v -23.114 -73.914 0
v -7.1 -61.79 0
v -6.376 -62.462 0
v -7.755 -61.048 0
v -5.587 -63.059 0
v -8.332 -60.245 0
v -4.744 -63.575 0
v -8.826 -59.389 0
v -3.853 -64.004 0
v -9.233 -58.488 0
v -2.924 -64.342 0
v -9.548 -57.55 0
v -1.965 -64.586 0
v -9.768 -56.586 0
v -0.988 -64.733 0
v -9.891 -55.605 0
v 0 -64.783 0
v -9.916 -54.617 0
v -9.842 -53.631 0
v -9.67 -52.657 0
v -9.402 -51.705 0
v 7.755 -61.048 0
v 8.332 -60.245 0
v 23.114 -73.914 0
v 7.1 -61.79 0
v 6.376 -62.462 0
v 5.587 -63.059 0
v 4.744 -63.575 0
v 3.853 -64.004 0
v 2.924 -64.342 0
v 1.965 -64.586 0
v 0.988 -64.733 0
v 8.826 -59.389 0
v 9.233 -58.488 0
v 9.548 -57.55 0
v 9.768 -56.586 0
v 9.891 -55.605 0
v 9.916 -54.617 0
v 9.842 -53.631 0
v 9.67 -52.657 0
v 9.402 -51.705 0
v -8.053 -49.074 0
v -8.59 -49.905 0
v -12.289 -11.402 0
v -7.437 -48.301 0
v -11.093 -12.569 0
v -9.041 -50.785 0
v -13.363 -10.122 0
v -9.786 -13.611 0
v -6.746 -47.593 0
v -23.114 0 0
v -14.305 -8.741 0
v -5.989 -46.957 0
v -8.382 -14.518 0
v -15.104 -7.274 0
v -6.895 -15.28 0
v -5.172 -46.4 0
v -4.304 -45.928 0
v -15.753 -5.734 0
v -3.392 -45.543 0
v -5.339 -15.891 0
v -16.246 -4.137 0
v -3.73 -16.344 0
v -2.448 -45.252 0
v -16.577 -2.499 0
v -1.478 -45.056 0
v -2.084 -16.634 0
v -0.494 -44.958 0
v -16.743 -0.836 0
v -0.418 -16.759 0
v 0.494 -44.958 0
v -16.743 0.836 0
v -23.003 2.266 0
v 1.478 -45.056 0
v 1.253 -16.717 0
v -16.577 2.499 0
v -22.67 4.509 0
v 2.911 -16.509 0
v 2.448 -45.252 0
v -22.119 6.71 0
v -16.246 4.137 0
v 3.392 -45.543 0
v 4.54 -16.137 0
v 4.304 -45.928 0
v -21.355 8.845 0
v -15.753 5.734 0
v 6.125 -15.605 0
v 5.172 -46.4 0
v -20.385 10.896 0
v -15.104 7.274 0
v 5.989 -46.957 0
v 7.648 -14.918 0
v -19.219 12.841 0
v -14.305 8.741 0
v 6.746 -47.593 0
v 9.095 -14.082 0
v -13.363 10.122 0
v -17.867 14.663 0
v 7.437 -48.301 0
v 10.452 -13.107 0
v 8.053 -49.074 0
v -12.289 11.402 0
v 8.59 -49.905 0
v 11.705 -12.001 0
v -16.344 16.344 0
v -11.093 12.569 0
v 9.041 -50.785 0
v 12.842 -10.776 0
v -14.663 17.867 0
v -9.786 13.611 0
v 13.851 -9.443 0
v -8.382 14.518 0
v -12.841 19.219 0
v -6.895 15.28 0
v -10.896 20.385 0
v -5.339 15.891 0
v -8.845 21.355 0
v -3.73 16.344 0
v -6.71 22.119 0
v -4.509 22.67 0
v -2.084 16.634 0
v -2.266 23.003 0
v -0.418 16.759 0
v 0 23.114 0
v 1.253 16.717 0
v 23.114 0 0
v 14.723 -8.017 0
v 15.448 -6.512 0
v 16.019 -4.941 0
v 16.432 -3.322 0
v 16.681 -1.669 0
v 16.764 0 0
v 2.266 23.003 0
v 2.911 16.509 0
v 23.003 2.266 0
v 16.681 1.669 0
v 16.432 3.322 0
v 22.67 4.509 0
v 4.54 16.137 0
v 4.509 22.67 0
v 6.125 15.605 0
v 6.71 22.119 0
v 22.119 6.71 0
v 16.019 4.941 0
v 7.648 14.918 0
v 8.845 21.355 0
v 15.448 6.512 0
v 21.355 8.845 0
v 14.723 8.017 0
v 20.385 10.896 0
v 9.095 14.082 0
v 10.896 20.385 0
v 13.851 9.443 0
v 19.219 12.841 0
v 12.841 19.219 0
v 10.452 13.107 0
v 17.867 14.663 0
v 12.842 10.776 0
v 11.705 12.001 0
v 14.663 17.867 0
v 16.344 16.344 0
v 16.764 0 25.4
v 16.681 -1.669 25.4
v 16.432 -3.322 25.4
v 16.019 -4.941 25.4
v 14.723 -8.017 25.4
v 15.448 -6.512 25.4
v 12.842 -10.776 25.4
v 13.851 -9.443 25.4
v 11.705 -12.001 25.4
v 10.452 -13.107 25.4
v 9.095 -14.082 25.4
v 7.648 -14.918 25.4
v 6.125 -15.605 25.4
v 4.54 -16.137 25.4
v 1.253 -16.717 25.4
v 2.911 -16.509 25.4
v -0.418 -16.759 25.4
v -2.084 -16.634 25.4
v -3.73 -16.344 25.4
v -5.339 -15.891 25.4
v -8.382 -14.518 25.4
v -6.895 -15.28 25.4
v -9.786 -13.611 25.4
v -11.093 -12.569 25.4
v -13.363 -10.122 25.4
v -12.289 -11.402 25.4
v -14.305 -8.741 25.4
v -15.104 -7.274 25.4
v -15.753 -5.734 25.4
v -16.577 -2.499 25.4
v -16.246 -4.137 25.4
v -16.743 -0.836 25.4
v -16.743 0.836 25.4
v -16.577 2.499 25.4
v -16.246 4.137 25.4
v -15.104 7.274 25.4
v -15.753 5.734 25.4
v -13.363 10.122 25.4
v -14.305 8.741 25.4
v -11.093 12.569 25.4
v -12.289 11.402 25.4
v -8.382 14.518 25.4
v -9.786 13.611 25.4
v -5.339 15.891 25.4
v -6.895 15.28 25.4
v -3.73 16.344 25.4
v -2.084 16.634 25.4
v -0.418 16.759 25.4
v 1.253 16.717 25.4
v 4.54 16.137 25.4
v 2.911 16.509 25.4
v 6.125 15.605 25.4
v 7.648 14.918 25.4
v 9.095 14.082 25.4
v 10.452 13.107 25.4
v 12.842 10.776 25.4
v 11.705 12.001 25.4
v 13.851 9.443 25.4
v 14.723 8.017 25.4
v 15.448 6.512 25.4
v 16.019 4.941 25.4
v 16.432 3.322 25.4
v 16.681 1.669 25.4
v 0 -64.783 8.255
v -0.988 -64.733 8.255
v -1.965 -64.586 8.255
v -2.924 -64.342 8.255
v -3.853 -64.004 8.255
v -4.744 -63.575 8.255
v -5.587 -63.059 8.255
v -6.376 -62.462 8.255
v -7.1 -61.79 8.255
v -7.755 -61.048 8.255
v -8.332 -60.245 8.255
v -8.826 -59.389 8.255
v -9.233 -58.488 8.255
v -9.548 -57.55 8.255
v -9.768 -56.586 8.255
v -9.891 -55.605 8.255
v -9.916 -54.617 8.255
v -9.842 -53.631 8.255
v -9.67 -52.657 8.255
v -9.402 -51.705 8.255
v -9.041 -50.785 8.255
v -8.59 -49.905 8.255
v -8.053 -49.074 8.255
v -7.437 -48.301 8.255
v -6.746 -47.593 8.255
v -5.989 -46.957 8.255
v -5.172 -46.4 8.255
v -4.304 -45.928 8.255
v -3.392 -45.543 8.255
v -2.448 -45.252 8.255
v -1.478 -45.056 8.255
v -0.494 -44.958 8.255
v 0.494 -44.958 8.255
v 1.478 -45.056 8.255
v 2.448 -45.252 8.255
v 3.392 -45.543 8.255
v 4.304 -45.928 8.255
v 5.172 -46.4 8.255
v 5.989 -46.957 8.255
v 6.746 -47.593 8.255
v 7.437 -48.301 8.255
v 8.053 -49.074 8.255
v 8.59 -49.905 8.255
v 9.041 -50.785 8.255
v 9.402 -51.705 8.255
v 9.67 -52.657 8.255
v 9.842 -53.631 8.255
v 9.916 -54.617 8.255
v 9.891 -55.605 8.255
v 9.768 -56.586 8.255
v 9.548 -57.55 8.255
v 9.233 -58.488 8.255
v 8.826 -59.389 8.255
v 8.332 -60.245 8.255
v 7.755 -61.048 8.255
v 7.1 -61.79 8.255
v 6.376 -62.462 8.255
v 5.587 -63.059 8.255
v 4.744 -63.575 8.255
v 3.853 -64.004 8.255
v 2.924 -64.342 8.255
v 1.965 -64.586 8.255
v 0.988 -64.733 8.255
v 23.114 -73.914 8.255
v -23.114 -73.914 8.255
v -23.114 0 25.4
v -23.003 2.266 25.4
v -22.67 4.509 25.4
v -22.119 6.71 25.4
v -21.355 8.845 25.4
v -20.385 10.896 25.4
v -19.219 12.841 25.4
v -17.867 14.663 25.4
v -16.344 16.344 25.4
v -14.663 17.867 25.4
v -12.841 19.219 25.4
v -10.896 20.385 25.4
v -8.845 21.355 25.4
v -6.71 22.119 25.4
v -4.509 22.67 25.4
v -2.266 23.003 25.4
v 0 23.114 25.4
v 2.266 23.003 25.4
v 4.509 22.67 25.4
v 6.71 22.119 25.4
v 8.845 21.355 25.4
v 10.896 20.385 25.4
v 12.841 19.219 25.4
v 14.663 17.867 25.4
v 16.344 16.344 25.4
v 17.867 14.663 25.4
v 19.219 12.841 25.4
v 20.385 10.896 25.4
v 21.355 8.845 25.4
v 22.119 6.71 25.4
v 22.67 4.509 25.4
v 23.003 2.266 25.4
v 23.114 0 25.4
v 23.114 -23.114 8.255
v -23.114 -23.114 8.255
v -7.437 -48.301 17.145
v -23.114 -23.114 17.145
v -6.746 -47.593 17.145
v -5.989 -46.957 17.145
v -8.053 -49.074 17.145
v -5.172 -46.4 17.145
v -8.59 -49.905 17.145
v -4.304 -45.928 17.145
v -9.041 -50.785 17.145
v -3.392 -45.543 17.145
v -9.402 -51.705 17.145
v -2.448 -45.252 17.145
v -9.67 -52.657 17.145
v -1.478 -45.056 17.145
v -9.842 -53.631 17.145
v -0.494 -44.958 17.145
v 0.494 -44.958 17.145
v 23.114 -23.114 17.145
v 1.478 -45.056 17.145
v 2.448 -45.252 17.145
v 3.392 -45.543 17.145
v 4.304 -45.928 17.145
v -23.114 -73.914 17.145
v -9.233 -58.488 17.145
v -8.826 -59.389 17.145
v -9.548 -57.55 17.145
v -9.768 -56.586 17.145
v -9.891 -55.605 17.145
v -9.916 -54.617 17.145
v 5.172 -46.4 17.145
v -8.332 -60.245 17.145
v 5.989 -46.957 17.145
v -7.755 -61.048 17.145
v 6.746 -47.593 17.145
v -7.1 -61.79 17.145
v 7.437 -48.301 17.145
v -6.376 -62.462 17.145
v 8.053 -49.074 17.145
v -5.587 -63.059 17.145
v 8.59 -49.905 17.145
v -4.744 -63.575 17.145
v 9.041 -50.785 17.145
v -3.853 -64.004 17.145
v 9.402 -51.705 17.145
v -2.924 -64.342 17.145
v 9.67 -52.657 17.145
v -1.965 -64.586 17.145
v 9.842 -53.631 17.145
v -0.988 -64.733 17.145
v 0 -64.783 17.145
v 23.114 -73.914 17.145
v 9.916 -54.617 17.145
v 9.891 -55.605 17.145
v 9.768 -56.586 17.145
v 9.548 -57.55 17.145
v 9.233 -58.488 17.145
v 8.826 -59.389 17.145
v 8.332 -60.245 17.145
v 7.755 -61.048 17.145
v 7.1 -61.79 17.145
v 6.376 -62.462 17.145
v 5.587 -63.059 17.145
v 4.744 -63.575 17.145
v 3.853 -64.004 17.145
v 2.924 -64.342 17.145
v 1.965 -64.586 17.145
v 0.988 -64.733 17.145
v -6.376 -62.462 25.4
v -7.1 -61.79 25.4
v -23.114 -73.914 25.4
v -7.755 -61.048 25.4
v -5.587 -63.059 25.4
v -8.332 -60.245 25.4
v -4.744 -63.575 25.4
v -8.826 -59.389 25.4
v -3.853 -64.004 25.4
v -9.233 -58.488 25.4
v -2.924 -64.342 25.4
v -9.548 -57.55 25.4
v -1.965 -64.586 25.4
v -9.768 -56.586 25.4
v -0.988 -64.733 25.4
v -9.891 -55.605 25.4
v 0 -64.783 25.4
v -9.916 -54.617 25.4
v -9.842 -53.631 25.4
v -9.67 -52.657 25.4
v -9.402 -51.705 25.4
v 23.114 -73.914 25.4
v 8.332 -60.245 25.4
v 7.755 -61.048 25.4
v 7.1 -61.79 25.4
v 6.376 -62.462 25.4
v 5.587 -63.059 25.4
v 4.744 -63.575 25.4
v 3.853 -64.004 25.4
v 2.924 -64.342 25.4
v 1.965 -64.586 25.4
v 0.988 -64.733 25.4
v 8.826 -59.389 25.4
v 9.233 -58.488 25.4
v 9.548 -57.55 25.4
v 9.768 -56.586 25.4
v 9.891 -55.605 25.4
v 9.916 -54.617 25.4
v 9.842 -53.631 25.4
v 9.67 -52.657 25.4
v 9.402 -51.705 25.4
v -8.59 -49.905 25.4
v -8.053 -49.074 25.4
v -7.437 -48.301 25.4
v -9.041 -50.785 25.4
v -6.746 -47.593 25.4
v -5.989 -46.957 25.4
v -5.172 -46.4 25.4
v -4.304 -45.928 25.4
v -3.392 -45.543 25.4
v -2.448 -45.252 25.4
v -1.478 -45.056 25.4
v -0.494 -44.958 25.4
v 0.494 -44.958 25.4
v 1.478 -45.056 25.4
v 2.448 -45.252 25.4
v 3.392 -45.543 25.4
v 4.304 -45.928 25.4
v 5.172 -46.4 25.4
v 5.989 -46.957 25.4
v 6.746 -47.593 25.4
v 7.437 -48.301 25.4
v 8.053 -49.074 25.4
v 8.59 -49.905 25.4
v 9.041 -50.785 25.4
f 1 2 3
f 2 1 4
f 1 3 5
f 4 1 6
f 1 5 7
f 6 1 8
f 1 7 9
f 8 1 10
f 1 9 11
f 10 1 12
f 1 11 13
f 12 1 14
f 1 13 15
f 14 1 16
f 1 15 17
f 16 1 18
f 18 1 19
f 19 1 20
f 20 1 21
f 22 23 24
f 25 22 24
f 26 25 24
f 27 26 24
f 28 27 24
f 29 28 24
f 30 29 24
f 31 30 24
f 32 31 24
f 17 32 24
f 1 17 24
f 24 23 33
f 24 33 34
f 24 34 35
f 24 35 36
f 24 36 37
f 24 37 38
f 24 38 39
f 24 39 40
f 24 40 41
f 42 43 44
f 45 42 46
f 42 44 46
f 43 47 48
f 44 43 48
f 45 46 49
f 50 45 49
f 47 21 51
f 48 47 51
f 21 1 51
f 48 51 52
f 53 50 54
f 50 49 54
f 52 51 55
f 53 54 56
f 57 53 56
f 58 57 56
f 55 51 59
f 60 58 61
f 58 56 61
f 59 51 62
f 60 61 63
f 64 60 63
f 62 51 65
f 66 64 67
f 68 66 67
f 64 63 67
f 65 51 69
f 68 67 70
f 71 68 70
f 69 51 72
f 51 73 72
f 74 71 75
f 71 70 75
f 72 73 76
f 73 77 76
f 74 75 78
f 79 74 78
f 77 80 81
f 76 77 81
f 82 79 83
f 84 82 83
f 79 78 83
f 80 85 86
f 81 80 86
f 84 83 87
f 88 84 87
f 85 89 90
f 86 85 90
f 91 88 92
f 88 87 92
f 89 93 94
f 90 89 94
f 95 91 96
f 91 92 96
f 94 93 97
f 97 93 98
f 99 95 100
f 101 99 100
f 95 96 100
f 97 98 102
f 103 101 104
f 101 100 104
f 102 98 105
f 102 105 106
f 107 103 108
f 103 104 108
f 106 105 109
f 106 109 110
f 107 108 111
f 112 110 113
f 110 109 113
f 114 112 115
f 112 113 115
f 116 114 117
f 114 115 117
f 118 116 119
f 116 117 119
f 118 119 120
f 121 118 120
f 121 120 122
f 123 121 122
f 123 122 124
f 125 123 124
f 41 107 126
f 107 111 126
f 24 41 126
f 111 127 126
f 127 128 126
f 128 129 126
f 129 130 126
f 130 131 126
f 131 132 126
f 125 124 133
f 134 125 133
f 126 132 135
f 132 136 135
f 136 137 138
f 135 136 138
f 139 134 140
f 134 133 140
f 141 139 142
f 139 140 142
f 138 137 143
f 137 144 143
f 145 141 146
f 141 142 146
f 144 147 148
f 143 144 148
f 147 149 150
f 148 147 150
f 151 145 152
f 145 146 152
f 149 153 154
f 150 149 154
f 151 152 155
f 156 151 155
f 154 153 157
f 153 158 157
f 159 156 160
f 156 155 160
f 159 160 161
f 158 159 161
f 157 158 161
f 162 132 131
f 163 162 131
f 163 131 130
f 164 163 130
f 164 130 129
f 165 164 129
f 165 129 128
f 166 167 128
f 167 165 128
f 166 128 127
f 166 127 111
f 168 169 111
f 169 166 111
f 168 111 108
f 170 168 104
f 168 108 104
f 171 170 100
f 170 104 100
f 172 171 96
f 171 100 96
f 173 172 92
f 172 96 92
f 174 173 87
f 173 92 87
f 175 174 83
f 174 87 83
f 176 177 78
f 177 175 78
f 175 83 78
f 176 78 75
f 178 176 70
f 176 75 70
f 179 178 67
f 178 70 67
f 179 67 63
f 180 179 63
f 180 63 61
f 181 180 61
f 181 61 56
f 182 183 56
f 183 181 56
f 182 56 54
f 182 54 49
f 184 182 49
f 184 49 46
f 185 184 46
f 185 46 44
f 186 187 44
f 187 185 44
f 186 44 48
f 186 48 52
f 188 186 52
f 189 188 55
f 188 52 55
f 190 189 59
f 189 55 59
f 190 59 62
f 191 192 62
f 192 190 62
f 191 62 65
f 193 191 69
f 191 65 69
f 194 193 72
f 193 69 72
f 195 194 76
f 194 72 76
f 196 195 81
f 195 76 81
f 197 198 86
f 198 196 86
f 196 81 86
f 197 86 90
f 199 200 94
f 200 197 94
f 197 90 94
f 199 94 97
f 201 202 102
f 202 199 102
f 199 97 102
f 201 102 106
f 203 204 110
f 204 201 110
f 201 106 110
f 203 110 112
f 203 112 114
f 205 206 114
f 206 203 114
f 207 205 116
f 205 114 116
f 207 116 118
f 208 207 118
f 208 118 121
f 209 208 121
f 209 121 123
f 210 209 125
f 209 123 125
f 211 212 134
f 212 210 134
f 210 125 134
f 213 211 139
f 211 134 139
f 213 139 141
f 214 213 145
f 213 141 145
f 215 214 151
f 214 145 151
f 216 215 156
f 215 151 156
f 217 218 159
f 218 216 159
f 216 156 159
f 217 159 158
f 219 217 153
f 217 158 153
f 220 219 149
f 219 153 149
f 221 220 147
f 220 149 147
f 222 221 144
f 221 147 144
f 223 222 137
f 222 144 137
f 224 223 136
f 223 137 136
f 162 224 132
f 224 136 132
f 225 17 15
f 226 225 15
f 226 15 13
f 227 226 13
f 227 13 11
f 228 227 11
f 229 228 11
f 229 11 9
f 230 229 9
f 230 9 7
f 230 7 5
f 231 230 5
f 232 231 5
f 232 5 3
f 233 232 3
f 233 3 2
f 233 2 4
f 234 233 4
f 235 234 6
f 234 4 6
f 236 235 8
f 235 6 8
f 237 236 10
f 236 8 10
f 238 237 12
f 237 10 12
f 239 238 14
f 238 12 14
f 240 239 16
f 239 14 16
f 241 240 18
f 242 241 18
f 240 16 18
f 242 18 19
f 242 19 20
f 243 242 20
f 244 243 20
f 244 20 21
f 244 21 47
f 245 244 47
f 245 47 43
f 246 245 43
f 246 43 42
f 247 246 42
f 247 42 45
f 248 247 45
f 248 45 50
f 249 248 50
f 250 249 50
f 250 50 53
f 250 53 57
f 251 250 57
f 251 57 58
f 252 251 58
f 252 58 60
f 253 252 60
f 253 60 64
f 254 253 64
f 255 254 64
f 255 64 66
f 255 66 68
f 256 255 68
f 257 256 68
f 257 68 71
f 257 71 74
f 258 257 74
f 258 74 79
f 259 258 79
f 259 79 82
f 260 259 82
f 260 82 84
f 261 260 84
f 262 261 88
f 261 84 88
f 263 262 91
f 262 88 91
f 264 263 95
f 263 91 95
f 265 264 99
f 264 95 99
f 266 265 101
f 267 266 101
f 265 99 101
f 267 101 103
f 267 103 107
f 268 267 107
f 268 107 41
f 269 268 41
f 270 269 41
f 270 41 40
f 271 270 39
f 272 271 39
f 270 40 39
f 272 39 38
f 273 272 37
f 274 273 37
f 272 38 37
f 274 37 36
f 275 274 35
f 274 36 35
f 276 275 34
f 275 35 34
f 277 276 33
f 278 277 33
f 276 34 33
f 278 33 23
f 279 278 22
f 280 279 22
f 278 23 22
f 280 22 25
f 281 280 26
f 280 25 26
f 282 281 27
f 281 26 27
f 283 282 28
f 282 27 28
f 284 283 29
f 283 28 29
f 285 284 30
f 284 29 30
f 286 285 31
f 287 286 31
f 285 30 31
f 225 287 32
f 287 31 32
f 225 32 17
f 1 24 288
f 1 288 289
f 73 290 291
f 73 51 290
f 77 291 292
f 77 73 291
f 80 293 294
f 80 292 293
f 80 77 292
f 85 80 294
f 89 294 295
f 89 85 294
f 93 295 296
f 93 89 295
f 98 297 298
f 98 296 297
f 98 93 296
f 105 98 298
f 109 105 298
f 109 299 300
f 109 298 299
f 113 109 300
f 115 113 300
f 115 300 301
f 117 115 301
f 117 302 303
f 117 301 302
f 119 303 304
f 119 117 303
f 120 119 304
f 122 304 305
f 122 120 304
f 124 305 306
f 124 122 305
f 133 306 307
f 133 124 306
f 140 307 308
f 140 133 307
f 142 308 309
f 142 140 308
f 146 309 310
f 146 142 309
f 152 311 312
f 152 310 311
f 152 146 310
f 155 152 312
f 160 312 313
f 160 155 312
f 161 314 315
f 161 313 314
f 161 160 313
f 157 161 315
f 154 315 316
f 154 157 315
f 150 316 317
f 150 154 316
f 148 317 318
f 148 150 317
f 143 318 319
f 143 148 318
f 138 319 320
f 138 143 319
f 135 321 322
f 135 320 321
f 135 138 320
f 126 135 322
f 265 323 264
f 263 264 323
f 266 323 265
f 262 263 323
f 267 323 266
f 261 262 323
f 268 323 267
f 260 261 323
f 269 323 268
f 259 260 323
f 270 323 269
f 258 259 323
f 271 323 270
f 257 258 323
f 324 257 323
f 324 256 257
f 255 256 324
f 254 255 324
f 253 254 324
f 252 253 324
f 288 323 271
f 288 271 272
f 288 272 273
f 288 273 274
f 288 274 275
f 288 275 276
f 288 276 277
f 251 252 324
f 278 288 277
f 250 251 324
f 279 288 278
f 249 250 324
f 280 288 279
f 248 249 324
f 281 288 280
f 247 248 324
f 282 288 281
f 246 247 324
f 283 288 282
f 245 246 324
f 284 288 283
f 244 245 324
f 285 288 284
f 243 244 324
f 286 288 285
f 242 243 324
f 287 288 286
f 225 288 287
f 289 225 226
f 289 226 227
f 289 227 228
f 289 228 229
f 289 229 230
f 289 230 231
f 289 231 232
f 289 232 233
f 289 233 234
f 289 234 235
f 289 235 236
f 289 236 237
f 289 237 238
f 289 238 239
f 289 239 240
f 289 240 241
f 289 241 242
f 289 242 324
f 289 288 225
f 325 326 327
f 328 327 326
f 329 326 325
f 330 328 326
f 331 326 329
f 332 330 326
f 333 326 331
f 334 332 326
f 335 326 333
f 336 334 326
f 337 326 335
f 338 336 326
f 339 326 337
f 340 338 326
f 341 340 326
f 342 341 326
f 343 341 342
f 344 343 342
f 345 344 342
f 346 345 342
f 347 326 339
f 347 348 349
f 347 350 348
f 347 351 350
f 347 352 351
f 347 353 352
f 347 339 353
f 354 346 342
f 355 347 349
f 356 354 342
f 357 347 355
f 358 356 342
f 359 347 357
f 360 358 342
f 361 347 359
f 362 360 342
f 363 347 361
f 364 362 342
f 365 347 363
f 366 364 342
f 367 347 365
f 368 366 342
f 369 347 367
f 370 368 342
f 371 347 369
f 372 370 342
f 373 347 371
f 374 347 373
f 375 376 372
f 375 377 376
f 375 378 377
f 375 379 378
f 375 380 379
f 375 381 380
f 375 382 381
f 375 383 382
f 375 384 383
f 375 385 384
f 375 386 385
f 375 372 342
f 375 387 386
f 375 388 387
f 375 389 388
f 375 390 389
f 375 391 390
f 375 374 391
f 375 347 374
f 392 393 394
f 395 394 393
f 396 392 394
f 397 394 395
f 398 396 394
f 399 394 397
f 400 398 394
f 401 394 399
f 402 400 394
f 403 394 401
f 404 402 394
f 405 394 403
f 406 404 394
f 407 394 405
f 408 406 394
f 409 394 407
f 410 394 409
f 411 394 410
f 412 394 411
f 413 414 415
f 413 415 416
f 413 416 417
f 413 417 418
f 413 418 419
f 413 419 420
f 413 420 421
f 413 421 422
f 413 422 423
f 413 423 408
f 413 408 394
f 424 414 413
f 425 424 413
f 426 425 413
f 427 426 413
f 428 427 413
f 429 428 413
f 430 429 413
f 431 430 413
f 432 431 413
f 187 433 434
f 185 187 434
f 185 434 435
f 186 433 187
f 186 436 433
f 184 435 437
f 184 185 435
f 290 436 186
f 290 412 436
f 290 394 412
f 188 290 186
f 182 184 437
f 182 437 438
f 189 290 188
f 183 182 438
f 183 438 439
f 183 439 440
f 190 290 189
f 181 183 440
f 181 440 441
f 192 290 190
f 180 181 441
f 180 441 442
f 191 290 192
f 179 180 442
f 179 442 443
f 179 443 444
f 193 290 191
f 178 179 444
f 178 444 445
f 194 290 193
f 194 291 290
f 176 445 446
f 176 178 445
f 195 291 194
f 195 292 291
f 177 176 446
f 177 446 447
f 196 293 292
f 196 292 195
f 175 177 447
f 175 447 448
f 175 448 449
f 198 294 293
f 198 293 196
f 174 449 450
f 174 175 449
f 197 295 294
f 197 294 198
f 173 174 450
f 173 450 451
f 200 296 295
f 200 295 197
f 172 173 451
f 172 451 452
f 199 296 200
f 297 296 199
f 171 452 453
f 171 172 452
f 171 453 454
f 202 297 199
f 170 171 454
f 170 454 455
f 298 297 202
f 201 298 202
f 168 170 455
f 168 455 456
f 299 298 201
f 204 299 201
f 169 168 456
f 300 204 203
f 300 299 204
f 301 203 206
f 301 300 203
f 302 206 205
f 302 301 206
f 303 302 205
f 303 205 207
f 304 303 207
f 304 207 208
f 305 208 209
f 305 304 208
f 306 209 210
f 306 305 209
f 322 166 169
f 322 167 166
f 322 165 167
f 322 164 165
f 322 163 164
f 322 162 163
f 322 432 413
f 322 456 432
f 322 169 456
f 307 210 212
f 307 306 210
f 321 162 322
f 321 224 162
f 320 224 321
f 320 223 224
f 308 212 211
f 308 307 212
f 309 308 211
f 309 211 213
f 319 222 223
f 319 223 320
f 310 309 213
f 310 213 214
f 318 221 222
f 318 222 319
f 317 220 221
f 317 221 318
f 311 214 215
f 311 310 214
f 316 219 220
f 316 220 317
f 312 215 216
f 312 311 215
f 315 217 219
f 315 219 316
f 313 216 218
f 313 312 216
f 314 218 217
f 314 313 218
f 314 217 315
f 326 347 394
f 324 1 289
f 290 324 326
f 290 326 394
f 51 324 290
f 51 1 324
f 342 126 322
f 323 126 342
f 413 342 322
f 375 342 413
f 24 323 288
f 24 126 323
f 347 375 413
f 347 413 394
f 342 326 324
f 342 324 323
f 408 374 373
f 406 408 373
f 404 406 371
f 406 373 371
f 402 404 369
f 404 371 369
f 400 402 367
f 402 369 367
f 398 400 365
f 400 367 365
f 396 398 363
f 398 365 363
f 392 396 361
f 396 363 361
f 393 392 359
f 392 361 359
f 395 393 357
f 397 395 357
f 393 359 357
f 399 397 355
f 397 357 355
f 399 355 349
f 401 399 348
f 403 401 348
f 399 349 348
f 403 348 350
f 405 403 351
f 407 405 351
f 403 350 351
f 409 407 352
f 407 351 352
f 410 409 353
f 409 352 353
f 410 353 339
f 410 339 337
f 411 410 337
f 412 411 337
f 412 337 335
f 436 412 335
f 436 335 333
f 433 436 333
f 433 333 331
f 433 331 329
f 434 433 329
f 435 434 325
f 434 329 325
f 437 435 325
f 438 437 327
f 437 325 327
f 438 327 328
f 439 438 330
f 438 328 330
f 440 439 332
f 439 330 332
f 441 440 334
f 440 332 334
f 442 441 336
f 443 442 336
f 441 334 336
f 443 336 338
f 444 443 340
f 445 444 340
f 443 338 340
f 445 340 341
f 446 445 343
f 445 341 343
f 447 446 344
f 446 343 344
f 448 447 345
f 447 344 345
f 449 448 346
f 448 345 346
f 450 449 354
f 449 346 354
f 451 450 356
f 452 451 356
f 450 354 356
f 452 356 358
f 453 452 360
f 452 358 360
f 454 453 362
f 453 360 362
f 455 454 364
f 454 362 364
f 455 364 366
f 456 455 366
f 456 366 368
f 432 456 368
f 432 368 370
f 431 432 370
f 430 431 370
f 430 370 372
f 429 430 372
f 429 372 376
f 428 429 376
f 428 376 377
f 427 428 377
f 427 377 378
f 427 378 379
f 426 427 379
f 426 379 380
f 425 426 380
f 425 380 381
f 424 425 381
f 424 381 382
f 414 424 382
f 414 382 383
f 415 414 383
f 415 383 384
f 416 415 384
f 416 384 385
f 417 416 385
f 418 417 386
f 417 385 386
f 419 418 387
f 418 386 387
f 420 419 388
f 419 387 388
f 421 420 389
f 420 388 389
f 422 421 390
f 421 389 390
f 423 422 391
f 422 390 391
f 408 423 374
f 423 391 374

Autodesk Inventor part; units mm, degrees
ref_plane "YZ Plane" through (0, 0, 0) normal (1, 0, 0) x (0, 1, 0)
ref_plane "XZ Plane" through (0, 0, 0) normal (0, 1, 0) x (-1, 0, 0)
ref_plane "XY Plane" through (0, 0, 0) normal (0, 0, 1) x (1, 0, 0)
sketch "Sketch1" plane through (0, 0, 0) normal (0, 0, 1) x (1, 0, 0)
  circle A0 centre (0, 0) radius 16.764
  circle A1 centre (0, 0) radius 23.114
  line L0 (23.114, 0) -> (23.114, -73.914)
  line L1 (23.114, -73.914) -> (-23.114, -73.914)
  line L2 (-23.114, -73.914) -> (-23.114, 0)
  line L3 (23.114, -23.114) -> (0, -23.114)
  line L4 (-23.114, -23.114) -> (0, -23.114)
  dimension "d0" = 33.528
  dimension "d1" = 6.35
  dimension "d23" = 50.8
extrude "Extrusion2" add sketch "Sketch1" along normal blind 25.4
sketch "Sketch3" plane through (0, 0, 25.4) normal (0, 0, 1) x (1, 0, 0)
  line L0 (-23.114, 0) -> (-23.114, -73.914) projected
  line L1 (23.114, -73.914) -> (23.114, 0) projected
  line L2 (-23.114, -73.914) -> (23.114, -73.914)
  line L3 (23.114, -73.914) -> (23.114, -23.114)
  line L4 (23.114, -23.114) -> (-23.114, -23.114)
  line L5 (-23.114, -23.114) -> (-23.114, -73.914)
  arc A0 (23.114, 0) -> (-23.114, 0) centre (0, 0) ccw projected
  circle A1 centre (0, 0) radius 23.114
  line L6 (-23.114, -73.914) -> (23.114, -73.914) projected
  line L7 (0, -23.114) -> (0, -73.914)
  point P0 (0, -54.864)
  dimension "d24" = 19.05
hole "Hole1" at (0, -54.864, 25.4) direction (0, 0, -1) diameter 19.8374 end through all clearance for "Hex Head Bolt" size "3/4" standard "Ansi Unified Screw Threads"
sketch "Sketch6" plane through (-23.114, -73.914, 0) normal (0, -1, 0) x (1, 0, 0)
  line L0 (46.228, 0) -> (46.228, 25.4) projected
  line L1 (0, 0) -> (0, 25.4) projected
  line L2 (46.228, 8.255) -> (0, 8.255)
  line L3 (0, 8.255) -> (0, 17.145)
  line L4 (0, 17.145) -> (46.228, 17.145)
  line L5 (46.228, 17.145) -> (46.228, 8.255)
  line L6 (46.228, 25.4) -> (0, 25.4) projected
  line L7 (46.228, 0) -> (0, 0) projected
  point P0 (23.114, 0)
  dimension "d18" = 8.89
  dimension "d19" = 8.255
extrude "Extrusion3" cut sketch "Sketch6" against normal blind 50.8 contours L2 L1 L4 L0
sketch "Sketch7" plane through (0, 0, 25.4) normal (0, 0, 1) x (1, 0, 0)
  circle A0 centre (0, -54.864) radius 9.9187 projected
  circle A1 centre (0, 0) radius 16.764 projected
  dimension "d25" = 54.864
equation "\"d23\" = MountingArmLength"
equation "\"d19\" = ArmWidth"
equation "\"d20\" = MountingArmLength"
equation "\"ArmWidth\" = -0.5 * d18 + 0.5 * d7"
equation "\"ArmOffsetDist\" = d25"
equation "\"MountingArmLength\" = 50.8"
equation "\"d7\" = 25.4"
properties part number "FrameMountingBracket"
